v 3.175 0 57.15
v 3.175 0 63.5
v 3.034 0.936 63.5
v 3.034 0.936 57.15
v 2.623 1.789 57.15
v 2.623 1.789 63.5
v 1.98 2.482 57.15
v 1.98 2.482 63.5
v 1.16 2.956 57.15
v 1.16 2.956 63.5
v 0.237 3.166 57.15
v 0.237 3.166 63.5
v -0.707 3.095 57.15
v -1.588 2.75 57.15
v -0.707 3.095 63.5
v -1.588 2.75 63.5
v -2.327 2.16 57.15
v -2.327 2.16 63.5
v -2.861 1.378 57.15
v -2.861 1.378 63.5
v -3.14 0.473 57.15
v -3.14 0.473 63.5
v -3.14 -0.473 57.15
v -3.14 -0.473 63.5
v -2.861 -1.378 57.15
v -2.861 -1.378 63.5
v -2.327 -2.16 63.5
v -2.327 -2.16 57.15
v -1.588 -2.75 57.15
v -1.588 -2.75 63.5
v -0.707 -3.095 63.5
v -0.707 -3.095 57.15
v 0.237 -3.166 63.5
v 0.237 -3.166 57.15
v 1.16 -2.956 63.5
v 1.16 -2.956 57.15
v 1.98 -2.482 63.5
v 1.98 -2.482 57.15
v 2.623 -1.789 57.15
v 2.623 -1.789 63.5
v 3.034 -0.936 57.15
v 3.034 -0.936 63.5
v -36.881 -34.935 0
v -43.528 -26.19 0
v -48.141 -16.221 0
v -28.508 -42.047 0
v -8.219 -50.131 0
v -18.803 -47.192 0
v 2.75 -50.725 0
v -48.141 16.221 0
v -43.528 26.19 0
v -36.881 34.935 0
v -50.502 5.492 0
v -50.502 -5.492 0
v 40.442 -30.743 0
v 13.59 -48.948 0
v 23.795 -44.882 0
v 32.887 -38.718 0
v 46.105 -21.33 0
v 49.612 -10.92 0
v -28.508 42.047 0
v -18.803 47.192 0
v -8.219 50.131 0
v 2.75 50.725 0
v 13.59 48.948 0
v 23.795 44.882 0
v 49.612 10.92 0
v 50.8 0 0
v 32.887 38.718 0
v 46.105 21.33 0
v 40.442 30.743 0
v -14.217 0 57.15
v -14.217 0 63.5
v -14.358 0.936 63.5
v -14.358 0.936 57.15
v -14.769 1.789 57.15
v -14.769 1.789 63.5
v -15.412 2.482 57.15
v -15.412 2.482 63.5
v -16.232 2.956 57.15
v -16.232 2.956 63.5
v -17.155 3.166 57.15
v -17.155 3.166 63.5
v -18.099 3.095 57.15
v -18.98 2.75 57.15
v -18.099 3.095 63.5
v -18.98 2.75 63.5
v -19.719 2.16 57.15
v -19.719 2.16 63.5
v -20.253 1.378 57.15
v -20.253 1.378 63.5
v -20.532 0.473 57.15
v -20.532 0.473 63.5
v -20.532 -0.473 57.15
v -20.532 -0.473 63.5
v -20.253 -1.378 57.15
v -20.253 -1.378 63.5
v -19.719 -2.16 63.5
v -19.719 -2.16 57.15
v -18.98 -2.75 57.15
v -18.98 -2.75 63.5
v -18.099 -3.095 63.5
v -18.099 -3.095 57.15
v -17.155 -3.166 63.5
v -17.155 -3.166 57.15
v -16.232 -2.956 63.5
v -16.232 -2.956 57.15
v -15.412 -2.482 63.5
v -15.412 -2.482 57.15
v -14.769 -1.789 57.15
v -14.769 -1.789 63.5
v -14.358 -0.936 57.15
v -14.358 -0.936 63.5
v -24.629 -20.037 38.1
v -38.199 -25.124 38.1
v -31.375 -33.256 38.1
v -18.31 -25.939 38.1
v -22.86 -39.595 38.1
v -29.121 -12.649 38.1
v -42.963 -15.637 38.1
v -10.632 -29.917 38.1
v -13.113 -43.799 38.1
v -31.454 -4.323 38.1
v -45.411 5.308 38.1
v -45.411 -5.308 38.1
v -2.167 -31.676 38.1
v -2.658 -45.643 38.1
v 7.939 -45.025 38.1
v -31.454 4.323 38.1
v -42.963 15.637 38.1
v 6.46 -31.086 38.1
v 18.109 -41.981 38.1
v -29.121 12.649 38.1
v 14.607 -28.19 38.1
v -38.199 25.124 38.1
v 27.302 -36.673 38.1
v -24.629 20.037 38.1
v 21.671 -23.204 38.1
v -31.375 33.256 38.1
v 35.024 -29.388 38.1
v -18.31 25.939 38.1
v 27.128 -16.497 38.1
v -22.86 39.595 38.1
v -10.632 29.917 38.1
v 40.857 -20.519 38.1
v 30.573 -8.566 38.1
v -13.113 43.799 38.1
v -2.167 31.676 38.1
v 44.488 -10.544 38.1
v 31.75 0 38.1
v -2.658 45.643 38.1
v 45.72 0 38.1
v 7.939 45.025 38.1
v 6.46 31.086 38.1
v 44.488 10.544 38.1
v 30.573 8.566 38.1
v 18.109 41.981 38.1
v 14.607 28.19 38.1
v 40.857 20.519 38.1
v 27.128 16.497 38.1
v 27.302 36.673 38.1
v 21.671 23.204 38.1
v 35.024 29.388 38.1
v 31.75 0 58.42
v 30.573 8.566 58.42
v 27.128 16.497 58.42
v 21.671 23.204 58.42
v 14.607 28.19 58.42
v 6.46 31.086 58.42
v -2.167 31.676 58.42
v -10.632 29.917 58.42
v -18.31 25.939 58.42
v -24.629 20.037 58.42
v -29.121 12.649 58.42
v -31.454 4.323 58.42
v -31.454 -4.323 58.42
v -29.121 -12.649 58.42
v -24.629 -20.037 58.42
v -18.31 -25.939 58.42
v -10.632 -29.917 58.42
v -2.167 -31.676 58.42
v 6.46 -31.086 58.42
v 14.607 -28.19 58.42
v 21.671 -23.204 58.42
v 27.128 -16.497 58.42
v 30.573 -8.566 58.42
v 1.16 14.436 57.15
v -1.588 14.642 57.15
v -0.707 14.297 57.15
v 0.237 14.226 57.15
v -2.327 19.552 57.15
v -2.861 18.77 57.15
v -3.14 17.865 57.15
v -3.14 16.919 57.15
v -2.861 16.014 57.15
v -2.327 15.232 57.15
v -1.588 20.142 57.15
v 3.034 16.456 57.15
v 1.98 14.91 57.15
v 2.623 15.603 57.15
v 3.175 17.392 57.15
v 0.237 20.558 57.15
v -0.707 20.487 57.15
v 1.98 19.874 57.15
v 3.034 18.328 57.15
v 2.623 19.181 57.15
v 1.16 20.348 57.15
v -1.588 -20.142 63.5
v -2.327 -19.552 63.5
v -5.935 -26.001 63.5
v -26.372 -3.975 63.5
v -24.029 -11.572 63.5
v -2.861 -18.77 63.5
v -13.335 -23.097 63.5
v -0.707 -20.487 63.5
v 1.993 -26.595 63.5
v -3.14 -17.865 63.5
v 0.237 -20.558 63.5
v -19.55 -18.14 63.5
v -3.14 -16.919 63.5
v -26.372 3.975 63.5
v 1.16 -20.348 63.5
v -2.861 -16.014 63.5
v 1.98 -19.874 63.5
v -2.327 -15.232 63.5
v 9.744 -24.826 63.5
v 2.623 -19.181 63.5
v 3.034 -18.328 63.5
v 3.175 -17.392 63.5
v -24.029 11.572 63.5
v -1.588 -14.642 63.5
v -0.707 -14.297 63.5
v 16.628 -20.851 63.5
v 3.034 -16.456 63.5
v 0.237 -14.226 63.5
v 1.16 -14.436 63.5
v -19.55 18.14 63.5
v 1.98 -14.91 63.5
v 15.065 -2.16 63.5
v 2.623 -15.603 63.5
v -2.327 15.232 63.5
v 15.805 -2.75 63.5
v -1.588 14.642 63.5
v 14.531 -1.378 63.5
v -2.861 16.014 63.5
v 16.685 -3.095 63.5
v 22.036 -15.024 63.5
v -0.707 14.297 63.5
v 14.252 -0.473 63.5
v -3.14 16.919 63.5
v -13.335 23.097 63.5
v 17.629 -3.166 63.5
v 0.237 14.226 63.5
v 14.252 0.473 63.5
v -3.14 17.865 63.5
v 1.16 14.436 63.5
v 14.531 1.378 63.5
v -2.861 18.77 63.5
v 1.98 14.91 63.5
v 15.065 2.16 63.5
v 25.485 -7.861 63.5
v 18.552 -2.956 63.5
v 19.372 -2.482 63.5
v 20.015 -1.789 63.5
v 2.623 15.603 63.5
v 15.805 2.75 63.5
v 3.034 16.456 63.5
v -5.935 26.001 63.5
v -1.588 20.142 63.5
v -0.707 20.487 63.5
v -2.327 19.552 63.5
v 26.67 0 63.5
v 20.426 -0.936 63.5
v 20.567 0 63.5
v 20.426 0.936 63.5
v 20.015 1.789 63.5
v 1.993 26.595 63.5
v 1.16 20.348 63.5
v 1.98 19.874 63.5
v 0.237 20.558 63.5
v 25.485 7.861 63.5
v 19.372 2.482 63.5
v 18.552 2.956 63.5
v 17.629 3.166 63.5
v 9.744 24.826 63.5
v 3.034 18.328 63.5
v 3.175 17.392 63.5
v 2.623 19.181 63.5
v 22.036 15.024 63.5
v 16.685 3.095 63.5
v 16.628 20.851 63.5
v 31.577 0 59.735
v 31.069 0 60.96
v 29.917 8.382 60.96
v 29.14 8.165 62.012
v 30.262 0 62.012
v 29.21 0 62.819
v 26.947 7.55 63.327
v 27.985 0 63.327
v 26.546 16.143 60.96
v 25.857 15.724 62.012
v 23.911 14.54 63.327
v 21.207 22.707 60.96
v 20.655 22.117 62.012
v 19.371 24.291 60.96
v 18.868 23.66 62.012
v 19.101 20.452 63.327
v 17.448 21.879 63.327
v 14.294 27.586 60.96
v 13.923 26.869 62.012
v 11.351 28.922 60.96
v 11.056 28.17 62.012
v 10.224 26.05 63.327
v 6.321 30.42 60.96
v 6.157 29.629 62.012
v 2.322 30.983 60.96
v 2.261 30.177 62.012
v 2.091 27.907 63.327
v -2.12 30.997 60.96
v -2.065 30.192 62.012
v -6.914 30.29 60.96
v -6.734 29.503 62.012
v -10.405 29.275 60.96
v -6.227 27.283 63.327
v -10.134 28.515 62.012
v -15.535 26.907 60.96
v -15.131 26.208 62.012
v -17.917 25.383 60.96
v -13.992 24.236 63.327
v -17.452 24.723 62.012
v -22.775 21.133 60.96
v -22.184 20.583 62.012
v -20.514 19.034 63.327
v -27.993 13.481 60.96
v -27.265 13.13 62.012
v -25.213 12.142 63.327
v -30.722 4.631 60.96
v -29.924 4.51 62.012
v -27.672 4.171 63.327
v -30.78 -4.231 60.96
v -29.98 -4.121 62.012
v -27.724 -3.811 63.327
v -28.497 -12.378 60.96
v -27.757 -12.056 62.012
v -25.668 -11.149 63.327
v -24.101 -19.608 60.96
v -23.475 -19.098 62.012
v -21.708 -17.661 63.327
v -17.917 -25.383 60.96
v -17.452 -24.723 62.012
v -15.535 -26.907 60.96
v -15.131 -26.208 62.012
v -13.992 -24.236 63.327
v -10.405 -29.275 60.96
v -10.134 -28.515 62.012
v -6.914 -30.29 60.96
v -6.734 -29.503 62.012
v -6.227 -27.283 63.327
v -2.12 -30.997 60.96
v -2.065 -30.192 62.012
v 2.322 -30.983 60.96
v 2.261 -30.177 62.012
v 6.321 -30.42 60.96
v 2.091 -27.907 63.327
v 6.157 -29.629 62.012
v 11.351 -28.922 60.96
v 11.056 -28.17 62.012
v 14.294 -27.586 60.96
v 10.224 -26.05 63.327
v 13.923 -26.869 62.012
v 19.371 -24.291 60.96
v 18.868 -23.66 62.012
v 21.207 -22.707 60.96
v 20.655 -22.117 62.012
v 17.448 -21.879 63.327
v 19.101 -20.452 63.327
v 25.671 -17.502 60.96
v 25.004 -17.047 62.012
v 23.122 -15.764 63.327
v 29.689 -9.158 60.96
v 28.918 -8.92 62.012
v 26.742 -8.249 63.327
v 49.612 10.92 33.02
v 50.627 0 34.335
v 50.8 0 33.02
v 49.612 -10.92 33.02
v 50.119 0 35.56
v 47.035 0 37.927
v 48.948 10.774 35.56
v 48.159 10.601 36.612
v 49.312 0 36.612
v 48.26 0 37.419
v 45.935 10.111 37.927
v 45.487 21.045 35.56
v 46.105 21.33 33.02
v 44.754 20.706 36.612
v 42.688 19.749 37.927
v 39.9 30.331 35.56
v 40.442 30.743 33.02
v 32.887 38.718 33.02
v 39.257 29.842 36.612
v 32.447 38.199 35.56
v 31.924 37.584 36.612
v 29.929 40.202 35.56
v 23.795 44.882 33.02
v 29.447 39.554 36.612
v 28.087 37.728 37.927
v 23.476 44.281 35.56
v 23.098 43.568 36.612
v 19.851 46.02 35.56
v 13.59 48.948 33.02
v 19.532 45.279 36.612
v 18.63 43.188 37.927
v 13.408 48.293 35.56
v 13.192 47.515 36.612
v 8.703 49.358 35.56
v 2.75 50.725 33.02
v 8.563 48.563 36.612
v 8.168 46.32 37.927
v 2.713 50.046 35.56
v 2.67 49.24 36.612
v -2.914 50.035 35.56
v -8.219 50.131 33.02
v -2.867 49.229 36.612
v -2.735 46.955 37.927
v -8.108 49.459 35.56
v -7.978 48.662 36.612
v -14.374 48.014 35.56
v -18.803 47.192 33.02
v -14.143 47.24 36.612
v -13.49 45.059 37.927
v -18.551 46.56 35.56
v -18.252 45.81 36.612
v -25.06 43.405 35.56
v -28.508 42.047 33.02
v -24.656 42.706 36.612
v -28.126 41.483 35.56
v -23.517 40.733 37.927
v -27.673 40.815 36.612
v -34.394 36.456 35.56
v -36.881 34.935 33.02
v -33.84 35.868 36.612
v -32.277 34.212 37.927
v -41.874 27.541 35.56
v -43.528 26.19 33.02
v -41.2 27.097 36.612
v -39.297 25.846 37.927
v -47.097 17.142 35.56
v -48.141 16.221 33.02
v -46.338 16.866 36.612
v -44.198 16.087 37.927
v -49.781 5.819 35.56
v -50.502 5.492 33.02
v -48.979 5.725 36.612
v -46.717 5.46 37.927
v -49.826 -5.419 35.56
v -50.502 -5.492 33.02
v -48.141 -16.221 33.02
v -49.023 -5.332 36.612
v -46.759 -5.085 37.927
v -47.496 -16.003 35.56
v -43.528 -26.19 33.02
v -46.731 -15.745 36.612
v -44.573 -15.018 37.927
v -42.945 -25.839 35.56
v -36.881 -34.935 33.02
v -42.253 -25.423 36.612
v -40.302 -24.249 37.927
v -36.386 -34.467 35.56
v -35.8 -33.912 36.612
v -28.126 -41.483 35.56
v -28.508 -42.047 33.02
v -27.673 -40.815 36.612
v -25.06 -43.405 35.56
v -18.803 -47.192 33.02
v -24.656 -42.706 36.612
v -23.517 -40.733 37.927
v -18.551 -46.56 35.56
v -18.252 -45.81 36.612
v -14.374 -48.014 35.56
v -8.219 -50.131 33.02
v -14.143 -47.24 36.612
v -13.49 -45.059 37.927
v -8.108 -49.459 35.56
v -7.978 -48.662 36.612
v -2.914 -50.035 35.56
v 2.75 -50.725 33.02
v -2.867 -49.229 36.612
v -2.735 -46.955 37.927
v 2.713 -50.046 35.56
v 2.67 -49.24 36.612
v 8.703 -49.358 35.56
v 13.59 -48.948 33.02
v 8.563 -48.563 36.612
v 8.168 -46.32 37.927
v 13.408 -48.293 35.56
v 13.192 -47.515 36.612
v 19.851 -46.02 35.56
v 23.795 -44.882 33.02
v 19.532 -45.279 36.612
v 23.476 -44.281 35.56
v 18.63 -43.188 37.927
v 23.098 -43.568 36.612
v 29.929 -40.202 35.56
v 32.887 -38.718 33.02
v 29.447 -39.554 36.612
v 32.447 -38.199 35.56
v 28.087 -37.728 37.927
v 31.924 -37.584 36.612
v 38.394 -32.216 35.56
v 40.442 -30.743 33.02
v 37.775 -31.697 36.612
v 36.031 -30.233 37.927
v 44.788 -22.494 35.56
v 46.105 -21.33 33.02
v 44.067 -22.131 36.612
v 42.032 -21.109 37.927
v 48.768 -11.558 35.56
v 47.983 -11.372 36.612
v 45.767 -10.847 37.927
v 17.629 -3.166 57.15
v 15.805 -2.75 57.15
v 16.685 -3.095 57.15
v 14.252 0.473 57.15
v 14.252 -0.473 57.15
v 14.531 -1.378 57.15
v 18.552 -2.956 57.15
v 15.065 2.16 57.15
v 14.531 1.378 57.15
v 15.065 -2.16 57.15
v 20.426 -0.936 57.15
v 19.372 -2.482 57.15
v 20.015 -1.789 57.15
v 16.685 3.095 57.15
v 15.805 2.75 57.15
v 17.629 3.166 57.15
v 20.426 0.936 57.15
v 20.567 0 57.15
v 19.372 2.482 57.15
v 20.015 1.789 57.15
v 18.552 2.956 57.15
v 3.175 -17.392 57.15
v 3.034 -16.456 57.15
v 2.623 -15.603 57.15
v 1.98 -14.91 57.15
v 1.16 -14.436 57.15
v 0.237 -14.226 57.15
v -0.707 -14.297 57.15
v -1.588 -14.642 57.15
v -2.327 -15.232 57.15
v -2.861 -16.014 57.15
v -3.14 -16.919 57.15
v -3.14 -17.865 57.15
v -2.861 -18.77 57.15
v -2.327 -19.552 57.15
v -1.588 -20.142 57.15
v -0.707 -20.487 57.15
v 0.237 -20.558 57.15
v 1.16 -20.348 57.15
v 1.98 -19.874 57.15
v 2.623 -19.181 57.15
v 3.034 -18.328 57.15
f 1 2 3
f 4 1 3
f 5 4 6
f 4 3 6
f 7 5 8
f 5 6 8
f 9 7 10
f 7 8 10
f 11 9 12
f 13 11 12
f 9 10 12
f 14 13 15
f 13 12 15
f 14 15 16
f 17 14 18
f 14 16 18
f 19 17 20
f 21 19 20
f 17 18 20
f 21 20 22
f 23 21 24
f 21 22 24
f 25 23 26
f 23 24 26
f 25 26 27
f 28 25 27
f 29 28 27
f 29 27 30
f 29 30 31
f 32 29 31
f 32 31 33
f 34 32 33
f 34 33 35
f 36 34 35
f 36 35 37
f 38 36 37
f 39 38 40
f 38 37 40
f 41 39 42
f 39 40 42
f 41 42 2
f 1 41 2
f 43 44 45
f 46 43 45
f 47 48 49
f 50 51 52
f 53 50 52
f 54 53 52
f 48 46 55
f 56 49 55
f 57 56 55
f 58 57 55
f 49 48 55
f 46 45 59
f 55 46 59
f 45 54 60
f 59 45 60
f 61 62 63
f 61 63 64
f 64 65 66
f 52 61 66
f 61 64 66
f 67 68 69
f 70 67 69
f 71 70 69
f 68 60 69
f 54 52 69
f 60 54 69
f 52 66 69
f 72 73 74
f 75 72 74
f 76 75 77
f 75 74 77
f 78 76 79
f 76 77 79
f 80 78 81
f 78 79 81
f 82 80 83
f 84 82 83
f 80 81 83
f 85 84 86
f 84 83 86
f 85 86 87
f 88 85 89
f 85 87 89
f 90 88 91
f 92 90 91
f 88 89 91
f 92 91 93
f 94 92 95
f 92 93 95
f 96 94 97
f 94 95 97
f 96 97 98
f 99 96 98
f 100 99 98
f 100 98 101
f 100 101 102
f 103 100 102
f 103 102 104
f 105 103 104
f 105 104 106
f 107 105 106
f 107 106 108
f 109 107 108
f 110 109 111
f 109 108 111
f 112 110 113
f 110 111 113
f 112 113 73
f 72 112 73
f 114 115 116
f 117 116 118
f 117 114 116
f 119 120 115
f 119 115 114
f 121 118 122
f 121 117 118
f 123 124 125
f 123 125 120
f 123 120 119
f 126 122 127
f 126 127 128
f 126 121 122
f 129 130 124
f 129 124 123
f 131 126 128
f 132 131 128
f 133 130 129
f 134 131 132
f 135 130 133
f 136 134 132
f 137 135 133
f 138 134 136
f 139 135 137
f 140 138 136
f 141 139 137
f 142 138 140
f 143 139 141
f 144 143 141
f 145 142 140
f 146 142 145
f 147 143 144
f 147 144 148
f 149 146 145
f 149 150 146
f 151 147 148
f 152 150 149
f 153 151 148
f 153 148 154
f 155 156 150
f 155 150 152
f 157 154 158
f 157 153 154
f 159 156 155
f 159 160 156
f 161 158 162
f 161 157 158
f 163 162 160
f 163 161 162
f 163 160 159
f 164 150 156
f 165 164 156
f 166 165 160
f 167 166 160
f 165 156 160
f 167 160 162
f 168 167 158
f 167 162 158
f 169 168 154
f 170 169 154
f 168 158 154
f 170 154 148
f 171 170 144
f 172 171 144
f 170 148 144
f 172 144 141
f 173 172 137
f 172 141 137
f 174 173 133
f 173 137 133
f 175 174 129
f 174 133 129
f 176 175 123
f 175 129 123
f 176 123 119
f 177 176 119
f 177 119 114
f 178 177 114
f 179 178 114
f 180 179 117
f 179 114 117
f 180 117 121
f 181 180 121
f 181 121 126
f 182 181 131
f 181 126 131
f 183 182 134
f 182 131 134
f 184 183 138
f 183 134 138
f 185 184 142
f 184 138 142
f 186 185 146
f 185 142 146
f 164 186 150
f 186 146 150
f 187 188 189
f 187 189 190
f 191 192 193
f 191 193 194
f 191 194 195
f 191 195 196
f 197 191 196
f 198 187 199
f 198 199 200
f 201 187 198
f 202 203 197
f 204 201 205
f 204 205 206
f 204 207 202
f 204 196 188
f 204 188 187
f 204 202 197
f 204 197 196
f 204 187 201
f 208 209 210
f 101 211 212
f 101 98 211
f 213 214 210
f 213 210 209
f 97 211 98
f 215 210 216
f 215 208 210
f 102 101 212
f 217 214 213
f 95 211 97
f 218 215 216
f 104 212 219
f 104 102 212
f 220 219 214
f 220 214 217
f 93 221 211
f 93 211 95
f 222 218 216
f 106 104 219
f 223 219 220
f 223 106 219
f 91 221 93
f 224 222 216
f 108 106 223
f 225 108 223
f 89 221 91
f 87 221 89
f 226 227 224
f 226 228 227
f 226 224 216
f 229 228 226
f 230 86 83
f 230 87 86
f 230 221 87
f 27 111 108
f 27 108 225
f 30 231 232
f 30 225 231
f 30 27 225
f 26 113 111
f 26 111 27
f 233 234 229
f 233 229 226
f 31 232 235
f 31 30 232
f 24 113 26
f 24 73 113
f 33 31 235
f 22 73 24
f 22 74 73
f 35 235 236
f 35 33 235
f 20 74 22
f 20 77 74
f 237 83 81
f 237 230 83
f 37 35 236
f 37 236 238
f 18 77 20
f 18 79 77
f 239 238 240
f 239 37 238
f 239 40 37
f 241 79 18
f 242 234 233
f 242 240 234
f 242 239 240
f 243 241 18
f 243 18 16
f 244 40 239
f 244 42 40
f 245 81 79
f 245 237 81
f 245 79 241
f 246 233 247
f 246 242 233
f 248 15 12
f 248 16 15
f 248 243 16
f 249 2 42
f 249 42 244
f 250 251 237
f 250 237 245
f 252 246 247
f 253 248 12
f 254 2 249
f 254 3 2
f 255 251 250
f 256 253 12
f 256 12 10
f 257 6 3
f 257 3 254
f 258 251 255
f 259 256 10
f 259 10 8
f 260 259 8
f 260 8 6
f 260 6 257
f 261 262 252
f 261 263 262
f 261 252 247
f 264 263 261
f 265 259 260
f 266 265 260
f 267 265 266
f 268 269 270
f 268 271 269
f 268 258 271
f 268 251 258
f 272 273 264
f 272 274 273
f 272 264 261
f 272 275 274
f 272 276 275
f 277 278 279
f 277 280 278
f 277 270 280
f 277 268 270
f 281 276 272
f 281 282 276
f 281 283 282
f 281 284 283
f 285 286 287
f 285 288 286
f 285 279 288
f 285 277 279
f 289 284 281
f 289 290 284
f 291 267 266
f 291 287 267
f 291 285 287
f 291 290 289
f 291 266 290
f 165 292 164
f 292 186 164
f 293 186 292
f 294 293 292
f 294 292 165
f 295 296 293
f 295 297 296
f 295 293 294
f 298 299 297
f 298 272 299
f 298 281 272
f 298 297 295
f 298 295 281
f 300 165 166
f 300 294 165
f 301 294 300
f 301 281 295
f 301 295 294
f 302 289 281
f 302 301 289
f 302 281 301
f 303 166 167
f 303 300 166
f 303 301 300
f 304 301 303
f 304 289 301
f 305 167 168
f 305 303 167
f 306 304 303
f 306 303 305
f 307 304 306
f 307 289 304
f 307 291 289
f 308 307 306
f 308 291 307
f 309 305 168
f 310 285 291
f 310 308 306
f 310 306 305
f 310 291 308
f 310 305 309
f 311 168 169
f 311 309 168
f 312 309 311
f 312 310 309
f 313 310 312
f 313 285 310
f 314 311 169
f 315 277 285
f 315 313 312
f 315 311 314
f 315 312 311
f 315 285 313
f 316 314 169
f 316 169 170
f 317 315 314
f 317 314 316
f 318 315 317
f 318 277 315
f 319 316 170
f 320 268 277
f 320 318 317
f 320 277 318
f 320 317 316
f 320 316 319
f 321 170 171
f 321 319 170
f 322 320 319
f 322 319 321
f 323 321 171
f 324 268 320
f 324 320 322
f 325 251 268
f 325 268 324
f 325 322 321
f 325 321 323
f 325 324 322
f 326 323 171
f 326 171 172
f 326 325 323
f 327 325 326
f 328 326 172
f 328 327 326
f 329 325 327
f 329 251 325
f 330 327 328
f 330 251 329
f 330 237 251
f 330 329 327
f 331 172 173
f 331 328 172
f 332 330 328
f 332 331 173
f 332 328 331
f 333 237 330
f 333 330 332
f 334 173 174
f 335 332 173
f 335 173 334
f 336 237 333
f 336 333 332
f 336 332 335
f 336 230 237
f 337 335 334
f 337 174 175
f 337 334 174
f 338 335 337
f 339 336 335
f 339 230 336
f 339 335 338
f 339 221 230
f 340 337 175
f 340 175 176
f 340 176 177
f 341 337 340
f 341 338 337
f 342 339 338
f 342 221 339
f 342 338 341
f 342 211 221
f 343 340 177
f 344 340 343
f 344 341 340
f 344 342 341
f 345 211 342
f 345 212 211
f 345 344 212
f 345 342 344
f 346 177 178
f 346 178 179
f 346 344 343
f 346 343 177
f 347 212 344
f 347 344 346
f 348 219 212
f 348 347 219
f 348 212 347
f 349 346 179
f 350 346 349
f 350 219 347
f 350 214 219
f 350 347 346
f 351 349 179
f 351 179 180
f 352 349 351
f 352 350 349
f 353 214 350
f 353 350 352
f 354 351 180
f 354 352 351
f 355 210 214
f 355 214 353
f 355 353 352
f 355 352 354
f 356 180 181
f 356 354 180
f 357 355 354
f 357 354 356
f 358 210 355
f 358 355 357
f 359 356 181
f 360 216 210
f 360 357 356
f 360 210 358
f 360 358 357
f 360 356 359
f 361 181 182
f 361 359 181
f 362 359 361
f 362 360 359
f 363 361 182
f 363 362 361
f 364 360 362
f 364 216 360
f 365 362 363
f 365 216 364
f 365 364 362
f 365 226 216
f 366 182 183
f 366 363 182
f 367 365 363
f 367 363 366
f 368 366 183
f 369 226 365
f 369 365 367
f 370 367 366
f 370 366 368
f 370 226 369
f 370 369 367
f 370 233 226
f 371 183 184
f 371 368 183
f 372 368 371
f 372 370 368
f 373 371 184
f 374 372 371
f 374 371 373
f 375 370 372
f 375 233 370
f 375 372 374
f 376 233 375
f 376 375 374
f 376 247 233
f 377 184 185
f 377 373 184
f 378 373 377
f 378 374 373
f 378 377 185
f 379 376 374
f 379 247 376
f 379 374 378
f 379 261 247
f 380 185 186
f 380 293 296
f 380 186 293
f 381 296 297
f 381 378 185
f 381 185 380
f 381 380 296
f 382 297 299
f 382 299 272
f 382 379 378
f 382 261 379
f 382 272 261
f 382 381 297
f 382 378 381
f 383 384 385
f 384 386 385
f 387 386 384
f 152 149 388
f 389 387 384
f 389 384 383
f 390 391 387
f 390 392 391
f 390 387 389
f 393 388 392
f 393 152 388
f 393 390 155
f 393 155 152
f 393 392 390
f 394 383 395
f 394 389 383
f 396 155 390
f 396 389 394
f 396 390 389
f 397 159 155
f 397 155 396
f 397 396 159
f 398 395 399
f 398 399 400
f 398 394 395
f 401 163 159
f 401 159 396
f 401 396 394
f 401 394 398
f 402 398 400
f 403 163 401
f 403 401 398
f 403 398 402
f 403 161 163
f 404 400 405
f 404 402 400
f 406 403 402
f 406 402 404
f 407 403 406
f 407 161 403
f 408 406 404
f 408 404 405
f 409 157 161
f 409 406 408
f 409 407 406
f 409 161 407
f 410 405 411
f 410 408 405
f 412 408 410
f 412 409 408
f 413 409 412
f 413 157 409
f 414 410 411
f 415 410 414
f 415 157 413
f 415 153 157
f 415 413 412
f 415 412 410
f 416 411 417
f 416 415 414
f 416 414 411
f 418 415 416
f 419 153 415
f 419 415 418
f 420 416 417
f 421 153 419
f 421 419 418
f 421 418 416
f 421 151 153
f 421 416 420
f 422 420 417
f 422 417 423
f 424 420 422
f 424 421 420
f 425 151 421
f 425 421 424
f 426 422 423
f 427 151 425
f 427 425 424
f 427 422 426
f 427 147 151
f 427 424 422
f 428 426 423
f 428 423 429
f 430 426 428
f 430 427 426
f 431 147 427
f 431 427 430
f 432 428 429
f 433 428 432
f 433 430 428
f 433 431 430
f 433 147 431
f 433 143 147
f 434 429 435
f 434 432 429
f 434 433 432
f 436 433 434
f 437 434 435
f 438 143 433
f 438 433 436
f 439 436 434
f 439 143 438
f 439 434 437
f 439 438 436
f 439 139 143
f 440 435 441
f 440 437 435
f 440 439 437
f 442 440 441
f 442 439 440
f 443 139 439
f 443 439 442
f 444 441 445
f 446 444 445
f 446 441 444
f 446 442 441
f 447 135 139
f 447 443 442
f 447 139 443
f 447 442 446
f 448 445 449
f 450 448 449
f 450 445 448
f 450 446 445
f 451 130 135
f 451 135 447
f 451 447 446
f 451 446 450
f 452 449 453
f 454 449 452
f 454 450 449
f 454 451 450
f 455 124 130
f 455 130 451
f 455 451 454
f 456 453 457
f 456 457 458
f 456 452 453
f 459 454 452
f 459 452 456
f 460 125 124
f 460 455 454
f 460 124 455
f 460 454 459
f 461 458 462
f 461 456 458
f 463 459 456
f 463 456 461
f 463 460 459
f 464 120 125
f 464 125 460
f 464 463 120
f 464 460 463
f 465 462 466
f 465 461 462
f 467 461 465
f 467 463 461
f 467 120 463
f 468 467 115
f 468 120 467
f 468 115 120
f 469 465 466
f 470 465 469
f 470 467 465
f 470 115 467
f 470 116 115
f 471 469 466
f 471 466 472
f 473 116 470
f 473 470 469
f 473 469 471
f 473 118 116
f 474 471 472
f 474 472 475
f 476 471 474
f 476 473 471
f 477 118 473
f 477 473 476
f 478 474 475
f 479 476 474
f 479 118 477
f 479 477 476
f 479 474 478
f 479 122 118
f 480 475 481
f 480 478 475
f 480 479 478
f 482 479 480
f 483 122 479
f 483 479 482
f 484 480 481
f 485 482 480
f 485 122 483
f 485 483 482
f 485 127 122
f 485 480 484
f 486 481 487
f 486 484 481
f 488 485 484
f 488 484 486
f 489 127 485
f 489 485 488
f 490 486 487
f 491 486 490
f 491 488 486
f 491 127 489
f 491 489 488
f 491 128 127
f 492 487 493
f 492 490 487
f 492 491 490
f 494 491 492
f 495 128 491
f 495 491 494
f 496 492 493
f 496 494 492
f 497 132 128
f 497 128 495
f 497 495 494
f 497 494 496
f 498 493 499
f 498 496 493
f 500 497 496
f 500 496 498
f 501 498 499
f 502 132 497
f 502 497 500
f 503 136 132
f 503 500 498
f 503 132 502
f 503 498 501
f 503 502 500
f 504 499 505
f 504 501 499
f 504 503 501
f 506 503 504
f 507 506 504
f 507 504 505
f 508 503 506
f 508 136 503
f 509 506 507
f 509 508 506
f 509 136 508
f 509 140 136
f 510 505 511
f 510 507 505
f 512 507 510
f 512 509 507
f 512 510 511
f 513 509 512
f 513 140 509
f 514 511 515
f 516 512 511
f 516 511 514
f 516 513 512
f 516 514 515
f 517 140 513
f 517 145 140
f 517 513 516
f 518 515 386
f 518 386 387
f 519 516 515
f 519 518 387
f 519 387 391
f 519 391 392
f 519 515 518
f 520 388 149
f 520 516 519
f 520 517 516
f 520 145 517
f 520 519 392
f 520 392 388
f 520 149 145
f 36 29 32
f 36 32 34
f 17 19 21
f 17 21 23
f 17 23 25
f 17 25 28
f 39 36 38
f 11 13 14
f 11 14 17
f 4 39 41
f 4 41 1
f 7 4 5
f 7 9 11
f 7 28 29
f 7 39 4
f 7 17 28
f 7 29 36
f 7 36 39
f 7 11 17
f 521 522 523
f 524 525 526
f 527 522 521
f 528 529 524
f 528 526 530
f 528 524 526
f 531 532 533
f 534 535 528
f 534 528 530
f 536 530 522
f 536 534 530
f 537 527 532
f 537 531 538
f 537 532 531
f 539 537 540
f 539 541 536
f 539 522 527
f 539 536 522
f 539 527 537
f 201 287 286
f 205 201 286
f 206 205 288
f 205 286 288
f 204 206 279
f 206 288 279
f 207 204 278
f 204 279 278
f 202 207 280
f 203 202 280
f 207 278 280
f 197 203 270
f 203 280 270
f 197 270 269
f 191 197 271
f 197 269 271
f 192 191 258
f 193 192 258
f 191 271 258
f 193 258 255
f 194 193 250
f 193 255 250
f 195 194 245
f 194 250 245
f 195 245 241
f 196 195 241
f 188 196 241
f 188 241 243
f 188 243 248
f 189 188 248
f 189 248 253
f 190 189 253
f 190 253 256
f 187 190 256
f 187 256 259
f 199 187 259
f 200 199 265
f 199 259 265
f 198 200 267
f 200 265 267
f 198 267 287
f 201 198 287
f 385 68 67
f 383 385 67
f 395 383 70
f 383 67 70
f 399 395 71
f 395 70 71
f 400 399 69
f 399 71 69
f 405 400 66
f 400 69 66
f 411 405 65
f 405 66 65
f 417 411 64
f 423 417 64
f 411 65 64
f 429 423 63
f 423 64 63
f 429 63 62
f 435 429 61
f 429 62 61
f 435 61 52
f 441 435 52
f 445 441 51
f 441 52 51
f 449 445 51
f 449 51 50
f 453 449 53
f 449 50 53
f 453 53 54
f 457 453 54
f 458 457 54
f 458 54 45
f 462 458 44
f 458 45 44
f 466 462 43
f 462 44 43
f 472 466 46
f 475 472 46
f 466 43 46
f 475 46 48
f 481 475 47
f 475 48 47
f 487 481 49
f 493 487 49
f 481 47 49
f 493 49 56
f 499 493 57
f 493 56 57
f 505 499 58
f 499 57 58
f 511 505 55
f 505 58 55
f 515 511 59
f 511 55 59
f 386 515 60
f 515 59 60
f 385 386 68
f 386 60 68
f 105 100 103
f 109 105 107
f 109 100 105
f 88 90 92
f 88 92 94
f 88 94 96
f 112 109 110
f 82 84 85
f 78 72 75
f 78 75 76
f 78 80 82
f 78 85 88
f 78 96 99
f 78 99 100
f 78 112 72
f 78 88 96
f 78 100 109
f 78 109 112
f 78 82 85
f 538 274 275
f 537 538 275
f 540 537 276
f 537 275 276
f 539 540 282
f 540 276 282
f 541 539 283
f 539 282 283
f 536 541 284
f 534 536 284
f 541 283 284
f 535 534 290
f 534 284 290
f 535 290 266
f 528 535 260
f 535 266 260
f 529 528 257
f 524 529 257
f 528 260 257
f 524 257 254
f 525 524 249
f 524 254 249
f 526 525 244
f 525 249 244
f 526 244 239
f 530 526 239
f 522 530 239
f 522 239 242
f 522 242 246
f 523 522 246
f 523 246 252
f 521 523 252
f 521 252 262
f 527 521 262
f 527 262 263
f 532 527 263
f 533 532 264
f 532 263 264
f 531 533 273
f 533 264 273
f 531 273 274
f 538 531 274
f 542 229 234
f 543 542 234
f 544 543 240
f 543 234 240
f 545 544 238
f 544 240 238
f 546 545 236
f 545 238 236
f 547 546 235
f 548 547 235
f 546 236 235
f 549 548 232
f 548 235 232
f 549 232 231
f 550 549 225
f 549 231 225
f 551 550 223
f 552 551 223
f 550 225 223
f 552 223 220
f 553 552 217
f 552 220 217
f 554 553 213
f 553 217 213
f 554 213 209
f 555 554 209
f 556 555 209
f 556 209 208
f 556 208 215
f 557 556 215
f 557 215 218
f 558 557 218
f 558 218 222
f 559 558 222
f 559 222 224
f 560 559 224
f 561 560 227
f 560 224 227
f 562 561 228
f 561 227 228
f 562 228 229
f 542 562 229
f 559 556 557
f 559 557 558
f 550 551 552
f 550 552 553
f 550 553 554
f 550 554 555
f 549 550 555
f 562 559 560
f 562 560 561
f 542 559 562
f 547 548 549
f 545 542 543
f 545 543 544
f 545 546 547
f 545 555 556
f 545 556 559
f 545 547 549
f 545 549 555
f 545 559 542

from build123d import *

# Parameters (mm, degrees)
F0_R     = 50.8
F1_DEPTH = 38.1
F2_R     = 31.75
F3_DEPTH = 25.4
F4_R     = 3.175
F5_DEPTH = 6.35
F6_R     = 5.08


with BuildPart() as f1:
    # F0 (on Top) → F1 (new body)
    with BuildSketch(Plane.XY):
        Circle(F0_R)
    extrude(amount=F1_DEPTH)

    # F2 (on face) → F3 (join)
    with BuildSketch(Plane.XY.offset(38.1)):
        Circle(F2_R)
    extrude(amount=F3_DEPTH)

    # F4 (on face) → F5 (cut)
    with BuildSketch(Plane.XY.offset(63.5)):
        with Locations((-17.392001, 0)):
            Circle(F4_R)
        with Locations((0, -17.392001)):
            Circle(F4_R)
        with Locations((17.392001, 0)):
            Circle(F4_R)
        with Locations((0, 17.392001)):
            Circle(F4_R)
        Circle(F4_R)
    extrude(amount=-F5_DEPTH, mode=Mode.SUBTRACT)

    # F6
    f6_edges = [f1.edges().sort_by_distance(p)[0] for p in [
        (-31.75, 0, 63.5),
        (-50.8, 0, 38.1),
    ]]
    fillet(f6_edges, radius=F6_R)


solid = f1.part
